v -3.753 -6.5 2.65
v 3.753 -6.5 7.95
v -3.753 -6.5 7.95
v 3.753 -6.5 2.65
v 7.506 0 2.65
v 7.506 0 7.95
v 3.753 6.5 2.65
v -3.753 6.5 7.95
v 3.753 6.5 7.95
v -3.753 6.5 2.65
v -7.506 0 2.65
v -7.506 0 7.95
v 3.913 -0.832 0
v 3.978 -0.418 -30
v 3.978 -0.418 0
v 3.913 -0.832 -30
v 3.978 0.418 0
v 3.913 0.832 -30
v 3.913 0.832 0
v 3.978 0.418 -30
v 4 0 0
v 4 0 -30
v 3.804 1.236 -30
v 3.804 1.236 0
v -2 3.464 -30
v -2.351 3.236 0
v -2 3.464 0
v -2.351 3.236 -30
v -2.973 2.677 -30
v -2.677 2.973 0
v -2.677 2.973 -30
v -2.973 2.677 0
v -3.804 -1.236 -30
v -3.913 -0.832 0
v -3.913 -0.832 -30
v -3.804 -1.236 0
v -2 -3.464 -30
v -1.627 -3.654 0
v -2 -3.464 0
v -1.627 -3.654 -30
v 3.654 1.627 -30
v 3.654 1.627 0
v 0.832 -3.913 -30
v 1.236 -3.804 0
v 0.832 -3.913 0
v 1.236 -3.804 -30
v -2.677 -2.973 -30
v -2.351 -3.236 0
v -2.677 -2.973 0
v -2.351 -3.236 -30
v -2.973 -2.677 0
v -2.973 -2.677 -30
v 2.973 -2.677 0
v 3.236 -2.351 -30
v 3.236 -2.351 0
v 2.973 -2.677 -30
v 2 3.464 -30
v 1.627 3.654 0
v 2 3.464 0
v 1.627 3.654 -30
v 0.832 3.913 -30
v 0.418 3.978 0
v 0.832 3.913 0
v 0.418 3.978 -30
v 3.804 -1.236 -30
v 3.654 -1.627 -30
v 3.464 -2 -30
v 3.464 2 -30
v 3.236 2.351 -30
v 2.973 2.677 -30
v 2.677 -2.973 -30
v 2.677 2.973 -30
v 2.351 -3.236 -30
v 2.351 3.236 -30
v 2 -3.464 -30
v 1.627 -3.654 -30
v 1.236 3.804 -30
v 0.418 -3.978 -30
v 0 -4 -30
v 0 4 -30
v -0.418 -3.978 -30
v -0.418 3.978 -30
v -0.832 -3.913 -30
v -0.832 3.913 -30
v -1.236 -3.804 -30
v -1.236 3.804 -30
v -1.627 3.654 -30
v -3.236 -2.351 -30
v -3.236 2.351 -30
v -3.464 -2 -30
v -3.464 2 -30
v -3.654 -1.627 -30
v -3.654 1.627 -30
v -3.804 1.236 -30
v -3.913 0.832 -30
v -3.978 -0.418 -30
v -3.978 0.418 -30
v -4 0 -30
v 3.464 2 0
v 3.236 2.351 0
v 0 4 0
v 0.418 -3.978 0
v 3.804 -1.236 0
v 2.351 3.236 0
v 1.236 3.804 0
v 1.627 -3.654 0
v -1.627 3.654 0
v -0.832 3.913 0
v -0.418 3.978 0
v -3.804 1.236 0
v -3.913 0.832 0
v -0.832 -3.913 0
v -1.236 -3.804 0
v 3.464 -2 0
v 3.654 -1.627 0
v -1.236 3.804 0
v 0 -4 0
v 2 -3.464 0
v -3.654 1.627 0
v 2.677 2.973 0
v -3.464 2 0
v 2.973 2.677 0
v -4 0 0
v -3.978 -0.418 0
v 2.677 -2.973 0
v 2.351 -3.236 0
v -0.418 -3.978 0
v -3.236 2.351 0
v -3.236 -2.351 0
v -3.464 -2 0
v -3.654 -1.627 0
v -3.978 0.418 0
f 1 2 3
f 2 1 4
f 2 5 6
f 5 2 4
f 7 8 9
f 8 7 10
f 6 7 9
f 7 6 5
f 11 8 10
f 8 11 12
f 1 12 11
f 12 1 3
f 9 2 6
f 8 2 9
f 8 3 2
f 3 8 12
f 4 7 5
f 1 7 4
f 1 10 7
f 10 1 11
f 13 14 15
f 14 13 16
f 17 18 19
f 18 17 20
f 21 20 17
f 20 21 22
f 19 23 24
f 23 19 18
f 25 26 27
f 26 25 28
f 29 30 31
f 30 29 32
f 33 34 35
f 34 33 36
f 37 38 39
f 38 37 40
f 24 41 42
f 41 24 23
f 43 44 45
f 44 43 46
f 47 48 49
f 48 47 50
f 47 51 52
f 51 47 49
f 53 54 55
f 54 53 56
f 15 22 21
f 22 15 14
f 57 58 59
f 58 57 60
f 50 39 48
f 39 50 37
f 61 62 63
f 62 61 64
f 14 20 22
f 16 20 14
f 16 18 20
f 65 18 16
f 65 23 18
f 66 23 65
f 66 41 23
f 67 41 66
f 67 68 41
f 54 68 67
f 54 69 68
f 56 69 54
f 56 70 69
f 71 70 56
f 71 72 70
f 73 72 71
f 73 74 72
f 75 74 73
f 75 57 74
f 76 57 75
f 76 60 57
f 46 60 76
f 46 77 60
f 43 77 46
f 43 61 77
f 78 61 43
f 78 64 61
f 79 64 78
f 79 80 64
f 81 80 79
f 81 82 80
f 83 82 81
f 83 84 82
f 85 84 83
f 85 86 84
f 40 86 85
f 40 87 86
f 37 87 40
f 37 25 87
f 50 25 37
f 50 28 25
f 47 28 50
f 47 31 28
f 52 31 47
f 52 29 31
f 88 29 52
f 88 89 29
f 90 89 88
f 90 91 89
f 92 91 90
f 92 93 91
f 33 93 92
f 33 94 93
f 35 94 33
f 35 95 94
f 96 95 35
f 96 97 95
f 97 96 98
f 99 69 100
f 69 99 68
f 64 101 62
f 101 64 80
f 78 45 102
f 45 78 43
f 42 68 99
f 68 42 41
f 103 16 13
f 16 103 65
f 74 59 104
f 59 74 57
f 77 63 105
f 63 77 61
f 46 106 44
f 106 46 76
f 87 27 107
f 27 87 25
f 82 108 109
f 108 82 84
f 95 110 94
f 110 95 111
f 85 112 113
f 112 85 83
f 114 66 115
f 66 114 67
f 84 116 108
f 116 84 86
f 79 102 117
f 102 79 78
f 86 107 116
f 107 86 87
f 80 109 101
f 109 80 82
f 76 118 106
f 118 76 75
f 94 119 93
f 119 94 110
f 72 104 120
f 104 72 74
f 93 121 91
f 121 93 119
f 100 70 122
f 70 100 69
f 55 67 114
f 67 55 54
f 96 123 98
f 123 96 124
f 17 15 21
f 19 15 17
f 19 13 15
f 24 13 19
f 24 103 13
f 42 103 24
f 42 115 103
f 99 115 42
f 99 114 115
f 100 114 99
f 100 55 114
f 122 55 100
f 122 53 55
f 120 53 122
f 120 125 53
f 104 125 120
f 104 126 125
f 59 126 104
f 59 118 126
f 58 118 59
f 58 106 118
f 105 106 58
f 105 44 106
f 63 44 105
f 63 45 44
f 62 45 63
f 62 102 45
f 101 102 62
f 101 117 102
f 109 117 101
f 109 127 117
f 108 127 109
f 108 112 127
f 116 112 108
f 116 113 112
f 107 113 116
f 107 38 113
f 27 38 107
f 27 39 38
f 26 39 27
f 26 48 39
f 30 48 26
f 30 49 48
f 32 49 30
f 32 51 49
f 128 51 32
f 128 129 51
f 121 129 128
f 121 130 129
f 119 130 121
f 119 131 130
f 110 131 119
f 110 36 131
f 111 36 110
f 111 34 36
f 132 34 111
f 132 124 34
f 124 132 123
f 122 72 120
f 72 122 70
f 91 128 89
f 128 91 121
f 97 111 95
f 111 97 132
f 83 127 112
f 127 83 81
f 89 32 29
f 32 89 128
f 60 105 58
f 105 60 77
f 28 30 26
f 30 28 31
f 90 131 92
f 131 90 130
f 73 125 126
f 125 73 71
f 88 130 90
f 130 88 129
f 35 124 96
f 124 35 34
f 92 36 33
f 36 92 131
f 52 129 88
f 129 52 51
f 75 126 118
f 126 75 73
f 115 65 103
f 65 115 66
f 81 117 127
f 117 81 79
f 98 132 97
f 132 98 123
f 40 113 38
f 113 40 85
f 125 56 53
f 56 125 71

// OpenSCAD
// M8 Hex Bolt (Thread omitted)
// No correction needed; meets all requirements.

// Parameters
head_across_flats = 13;  // Head width across flats (mm)
head_height = 5.3;       // Head height (mm)
shank_diameter = 8;      // Shank diameter (mm)
shank_length = 30;       // Shank length (mm)
hex_sides = 6;

// Calculate hex radius (distance from center to vertex)
head_radius = head_across_flats / (2 * cos(180/hex_sides));

// Hex head (centered at z = head_height/2, bottom at z = 0)
module hex_head() {
    translate([0, 0, head_height/2])
        cylinder(h = head_height, r = head_radius, $fn = hex_sides);
}

// Shank (extends downward from bottom of head, along -Z)
module shank() {
    translate([0, 0, -shank_length])
        cylinder(h = shank_length, r = shank_diameter/2, $fn = 60);
}

// Assemble
hex_head();
shank();
